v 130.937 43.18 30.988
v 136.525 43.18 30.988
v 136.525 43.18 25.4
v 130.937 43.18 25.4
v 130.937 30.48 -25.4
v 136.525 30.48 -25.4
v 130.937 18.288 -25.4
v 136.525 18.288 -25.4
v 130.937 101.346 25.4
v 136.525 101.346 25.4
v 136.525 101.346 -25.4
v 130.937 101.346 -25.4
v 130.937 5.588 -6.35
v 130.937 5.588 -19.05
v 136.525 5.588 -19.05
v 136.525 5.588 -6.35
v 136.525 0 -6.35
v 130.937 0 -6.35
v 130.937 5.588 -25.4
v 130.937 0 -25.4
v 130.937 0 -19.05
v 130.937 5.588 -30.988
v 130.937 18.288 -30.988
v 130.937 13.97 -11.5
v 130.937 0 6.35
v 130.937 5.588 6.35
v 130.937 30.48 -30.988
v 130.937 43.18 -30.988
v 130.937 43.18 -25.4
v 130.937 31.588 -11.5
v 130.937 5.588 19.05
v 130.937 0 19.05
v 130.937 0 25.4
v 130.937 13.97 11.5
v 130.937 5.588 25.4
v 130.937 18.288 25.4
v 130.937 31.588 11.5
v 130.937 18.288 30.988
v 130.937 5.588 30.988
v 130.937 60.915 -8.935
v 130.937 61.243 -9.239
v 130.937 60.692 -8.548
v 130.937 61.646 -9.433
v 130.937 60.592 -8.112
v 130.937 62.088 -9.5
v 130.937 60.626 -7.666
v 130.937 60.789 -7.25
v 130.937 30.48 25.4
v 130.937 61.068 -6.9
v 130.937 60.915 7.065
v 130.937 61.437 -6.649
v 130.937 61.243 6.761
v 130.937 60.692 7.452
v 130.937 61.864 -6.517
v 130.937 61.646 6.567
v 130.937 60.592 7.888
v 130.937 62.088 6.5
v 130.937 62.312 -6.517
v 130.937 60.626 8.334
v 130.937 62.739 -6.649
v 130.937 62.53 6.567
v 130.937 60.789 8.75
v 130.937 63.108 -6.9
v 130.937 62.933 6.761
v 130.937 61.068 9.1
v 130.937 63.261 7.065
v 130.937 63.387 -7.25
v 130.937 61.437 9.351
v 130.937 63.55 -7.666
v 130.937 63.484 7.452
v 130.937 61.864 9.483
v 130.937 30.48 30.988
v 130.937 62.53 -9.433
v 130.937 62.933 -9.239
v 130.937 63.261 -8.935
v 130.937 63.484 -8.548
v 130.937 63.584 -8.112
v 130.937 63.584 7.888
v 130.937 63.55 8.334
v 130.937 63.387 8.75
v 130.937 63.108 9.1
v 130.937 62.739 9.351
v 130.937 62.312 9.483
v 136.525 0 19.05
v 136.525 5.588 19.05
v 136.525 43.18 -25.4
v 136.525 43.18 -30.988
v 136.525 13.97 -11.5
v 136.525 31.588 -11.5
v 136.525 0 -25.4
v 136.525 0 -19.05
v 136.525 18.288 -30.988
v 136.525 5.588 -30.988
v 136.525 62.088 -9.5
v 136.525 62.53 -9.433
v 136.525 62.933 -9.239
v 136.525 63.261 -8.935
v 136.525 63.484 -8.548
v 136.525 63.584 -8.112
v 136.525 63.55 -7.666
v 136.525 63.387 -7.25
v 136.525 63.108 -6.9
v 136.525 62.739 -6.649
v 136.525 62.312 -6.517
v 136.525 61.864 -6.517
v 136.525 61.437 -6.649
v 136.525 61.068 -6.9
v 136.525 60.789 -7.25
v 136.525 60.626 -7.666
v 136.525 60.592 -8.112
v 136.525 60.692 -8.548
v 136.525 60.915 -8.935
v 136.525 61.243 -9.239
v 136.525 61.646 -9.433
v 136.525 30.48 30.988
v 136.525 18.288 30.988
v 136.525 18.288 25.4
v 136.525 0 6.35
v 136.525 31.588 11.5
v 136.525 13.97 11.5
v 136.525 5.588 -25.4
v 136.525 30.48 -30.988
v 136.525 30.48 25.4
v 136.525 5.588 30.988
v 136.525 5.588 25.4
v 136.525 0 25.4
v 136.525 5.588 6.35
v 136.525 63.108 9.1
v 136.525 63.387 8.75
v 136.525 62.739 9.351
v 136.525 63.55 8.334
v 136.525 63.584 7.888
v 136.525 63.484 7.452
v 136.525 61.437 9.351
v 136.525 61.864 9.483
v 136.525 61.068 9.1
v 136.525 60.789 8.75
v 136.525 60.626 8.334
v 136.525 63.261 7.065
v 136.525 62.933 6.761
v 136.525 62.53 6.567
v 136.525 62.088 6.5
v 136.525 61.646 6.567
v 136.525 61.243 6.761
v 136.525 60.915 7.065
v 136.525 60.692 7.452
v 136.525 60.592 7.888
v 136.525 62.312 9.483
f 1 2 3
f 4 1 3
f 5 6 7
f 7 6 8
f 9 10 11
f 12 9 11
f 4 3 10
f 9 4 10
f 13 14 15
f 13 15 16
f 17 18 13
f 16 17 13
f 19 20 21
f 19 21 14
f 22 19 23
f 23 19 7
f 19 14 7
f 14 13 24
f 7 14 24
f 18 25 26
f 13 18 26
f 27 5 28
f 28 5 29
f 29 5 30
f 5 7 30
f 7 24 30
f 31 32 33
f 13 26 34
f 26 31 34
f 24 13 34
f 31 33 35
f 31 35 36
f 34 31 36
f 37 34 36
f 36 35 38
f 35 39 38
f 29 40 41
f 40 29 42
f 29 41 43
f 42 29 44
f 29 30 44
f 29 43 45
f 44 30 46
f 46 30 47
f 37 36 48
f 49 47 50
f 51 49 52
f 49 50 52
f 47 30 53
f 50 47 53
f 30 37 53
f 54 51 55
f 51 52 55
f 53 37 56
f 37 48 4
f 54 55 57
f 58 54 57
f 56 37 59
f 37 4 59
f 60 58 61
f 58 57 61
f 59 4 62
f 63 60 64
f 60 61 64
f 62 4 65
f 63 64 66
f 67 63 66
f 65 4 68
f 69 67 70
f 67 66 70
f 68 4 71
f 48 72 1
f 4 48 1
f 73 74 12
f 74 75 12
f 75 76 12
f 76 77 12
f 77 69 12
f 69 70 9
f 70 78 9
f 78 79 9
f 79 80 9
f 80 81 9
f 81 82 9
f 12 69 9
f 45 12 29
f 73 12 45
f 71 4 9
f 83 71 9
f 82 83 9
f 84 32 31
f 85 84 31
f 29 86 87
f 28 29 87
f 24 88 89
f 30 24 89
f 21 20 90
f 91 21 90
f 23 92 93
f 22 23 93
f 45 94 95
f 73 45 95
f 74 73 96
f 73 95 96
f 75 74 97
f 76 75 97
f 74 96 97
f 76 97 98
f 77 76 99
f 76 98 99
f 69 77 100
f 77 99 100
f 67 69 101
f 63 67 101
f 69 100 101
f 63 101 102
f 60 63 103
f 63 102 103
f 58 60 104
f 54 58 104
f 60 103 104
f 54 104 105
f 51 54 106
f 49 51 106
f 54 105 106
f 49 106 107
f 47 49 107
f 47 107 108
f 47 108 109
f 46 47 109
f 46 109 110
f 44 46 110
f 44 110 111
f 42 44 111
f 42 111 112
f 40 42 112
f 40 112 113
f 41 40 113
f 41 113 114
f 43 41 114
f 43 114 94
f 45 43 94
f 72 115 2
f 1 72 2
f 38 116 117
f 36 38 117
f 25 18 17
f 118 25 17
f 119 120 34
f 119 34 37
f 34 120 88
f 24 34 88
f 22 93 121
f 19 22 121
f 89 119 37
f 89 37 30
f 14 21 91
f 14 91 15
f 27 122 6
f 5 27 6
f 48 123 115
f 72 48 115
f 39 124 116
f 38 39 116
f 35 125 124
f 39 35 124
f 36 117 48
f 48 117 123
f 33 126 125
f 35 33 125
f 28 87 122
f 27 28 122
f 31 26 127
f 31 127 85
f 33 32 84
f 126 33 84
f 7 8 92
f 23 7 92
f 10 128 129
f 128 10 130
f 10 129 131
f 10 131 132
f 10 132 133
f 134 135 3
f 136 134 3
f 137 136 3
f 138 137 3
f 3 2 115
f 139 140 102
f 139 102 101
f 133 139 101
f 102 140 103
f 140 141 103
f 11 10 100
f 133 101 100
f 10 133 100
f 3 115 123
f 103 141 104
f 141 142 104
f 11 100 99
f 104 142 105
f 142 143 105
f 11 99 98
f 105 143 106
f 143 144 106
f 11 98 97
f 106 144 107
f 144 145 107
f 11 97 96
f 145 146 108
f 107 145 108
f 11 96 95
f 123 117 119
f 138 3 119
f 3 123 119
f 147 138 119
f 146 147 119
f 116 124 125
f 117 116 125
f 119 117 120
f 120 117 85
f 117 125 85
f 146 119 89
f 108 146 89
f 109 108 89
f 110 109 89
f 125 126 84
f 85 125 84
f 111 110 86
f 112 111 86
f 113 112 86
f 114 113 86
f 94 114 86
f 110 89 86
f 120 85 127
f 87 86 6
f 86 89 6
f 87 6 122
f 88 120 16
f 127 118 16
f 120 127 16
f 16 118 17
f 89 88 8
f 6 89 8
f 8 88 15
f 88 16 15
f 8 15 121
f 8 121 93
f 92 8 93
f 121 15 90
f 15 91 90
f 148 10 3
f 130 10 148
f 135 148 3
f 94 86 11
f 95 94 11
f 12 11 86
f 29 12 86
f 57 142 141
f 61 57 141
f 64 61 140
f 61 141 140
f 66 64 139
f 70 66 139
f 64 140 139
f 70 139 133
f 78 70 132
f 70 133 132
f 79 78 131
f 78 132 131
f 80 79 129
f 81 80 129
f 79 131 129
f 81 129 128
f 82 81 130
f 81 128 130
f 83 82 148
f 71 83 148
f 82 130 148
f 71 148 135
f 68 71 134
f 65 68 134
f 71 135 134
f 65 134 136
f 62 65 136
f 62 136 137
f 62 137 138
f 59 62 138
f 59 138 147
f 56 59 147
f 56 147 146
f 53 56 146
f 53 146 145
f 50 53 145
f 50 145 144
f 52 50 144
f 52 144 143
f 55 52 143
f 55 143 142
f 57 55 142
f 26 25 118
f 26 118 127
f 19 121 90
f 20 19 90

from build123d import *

# Parameters (mm, degrees)
SKETCH1_W              = 273.05
SKETCH1_H              = 139.7
BOSS_EXTRUDE1_DEPTH    = 5.588
SKETCH2_W              = 273.05
SKETCH2_H              = 139.7
SKETCH2_W_2            = 261.874
SKETCH2_H_2            = 128.524
BOSS_EXTRUDE2_DEPTH    = 298.45
SKETCH3_W              = 6.35
SKETCH3_H              = 16.933333333
SKETCH3_H_2            = 16.933333334
DOOR_SLOT_DEPTH        = 12.7
DOOR_GUIDE_HOLES_REACH = 361.255
SKETCH4_W              = 6.35
SKETCH4_H              = 15.875
LEVER_HOLES_W          = 9.652
LEVER_HOLES_H          = 6.35
LEVER_HOLES_W_2        = 6.35
CUT_EXTRUDE1_DEPTH     = 362.378293578
CUT_EXTRUDE3_REACH     = 416.577
SKETCH8_R              = 3.175
SKETCH16_W             = 327.238778096
SKETCH16_H             = 314.471565403
CUT_EXTRUDE10_DEPTH    = 362.378293578
LEFT_RIGHT_W           = 6.35
LEFT_RIGHT_H           = 5.588
LEFT_RIGHT_W_2         = 12.7
LEFT_RIGHT_H_2         = 12.66825
CUT_EXTRUDE11_DEPTH    = 415.577411883
SKETCH17_R             = 1.5
SKETCH17_W             = 23
SKETCH17_H             = 17.61800007
CUT_EXTRUDE12_DEPTH    = 313.00857951
CUT_EXTRUDE13_DEPTH    = 313.00857951


with BuildPart() as part:
    # Sketch1 → Boss-Extrude1 (new body)
    with BuildSketch(Plane(origin=(0, 0, 0), x_dir=(1, 0, 0), z_dir=(0, 1, 0))):
        Rectangle(SKETCH1_W, SKETCH1_H)
    extrude(amount=BOSS_EXTRUDE1_DEPTH)

    # Sketch2 → Boss-Extrude2 (add)
    with BuildSketch(Plane(origin=(0, 5.588, 0), x_dir=(1, 0, 0), z_dir=(0, 1, 0))):
        Rectangle(SKETCH2_W, SKETCH2_H)
        Rectangle(SKETCH2_W_2, SKETCH2_H_2, mode=Mode.SUBTRACT)
    extrude(amount=BOSS_EXTRUDE2_DEPTH)

    # Sketch3 → Door Slot (cut)
    with BuildSketch(Plane.XY.offset(69.85)):
        with BuildLine():
            Line((-29.337, 282.448), (-29.337, 5.588))
            Line((-29.337, 5.588), (-22.733, 5.588))
            Line((-22.733, 5.588), (-22.733, 291.592))
            Line((-22.733, 291.592), (-42.291, 291.592))
            Line((-42.291, 291.592), (-42.291, 284.988))
            Line((-42.291, 284.988), (-31.877, 284.988))
            ThreePointArc((-31.877, 284.988), (-30.080948776, 284.244051224), (-29.337, 282.448))
        make_face()
        with Locations((-13.208, 80.433333334)):
            Rectangle(SKETCH3_W, SKETCH3_H)
        with Locations((-13.208, 50.8)):
            Rectangle(SKETCH3_W, SKETCH3_H_2)
        with Locations((-13.208, 21.166666667)):
            Rectangle(SKETCH3_W, SKETCH3_H)
    extrude(amount=-DOOR_SLOT_DEPTH, mode=Mode.SUBTRACT)

    # Sketch4 → Door Guide Holes (cut, up to next)
    with BuildSketch(Plane.XY.offset(-64.262), mode=Mode.PRIVATE) as door_guide_holes_sk1:
        with Locations((-45.466, 283.4005)):
            Rectangle(SKETCH4_W, SKETCH4_H)
    door_guide_holes_tool1 = extrude(door_guide_holes_sk1.sketch, amount=-DOOR_GUIDE_HOLES_REACH, mode=Mode.PRIVATE) & part.part
    # Sketch4 → Door Guide Holes (cut, up to next)
    with BuildSketch(Plane.XY.offset(-64.262), mode=Mode.PRIVATE) as door_guide_holes_sk2:
        with Locations((-45.466, 254.8255)):
            Rectangle(SKETCH4_W, SKETCH4_H)
    door_guide_holes_tool2 = extrude(door_guide_holes_sk2.sketch, amount=-DOOR_GUIDE_HOLES_REACH, mode=Mode.PRIVATE) & part.part
    # Sketch4 → Door Guide Holes (cut, up to next)
    with BuildSketch(Plane.XY.offset(-64.262), mode=Mode.PRIVATE) as door_guide_holes_sk3:
        with Locations((-45.466, 226.2505)):
            Rectangle(SKETCH4_W, SKETCH4_H)
    door_guide_holes_tool3 = extrude(door_guide_holes_sk3.sketch, amount=-DOOR_GUIDE_HOLES_REACH, mode=Mode.PRIVATE) & part.part
    # Sketch4 → Door Guide Holes (cut, up to next)
    with BuildSketch(Plane.XY.offset(-64.262), mode=Mode.PRIVATE) as door_guide_holes_sk4:
        with Locations((-45.466, 197.6755)):
            Rectangle(SKETCH4_W, SKETCH4_H)
    door_guide_holes_tool4 = extrude(door_guide_holes_sk4.sketch, amount=-DOOR_GUIDE_HOLES_REACH, mode=Mode.PRIVATE) & part.part
    # Sketch4 → Door Guide Holes (cut, up to next)
    with BuildSketch(Plane.XY.offset(-64.262), mode=Mode.PRIVATE) as door_guide_holes_sk5:
        with Locations((-45.466, 169.1005)):
            Rectangle(SKETCH4_W, SKETCH4_H)
    door_guide_holes_tool5 = extrude(door_guide_holes_sk5.sketch, amount=-DOOR_GUIDE_HOLES_REACH, mode=Mode.PRIVATE) & part.part
    # Sketch4 → Door Guide Holes (cut, up to next)
    with BuildSketch(Plane.XY.offset(-64.262), mode=Mode.PRIVATE) as door_guide_holes_sk6:
        with Locations((-45.466, 140.5255)):
            Rectangle(SKETCH4_W, SKETCH4_H)
    door_guide_holes_tool6 = extrude(door_guide_holes_sk6.sketch, amount=-DOOR_GUIDE_HOLES_REACH, mode=Mode.PRIVATE) & part.part
    # Sketch4 → Door Guide Holes (cut, up to next)
    with BuildSketch(Plane.XY.offset(-64.262), mode=Mode.PRIVATE) as door_guide_holes_sk7:
        with Locations((-45.466, 111.9505)):
            Rectangle(SKETCH4_W, SKETCH4_H)
    door_guide_holes_tool7 = extrude(door_guide_holes_sk7.sketch, amount=-DOOR_GUIDE_HOLES_REACH, mode=Mode.PRIVATE) & part.part
    # Sketch4 → Door Guide Holes (cut, up to next)
    with BuildSketch(Plane.XY.offset(-64.262), mode=Mode.PRIVATE) as door_guide_holes_sk8:
        with Locations((-45.466, 83.3755)):
            Rectangle(SKETCH4_W, SKETCH4_H)
    door_guide_holes_tool8 = extrude(door_guide_holes_sk8.sketch, amount=-DOOR_GUIDE_HOLES_REACH, mode=Mode.PRIVATE) & part.part
    # Sketch4 → Door Guide Holes (cut, up to next)
    with BuildSketch(Plane.XY.offset(-64.262), mode=Mode.PRIVATE) as door_guide_holes_sk9:
        with Locations((-45.466, 54.8005)):
            Rectangle(SKETCH4_W, SKETCH4_H)
    door_guide_holes_tool9 = extrude(door_guide_holes_sk9.sketch, amount=-DOOR_GUIDE_HOLES_REACH, mode=Mode.PRIVATE) & part.part
    # Sketch4 → Door Guide Holes (cut, up to next)
    with BuildSketch(Plane.XY.offset(-64.262), mode=Mode.PRIVATE) as door_guide_holes_sk10:
        with Locations((-45.466, 26.2255)):
            Rectangle(SKETCH4_W, SKETCH4_H)
    door_guide_holes_tool10 = extrude(door_guide_holes_sk10.sketch, amount=-DOOR_GUIDE_HOLES_REACH, mode=Mode.PRIVATE) & part.part
    door_guide_holes_1 = door_guide_holes_tool1.solids().sort_by_distance((-45.466, 283.4005, -64.262))[0]
    add(door_guide_holes_1, mode=Mode.SUBTRACT)
    door_guide_holes_2 = door_guide_holes_tool2.solids().sort_by_distance((-45.466, 254.8255, -64.262))[0]
    add(door_guide_holes_2, mode=Mode.SUBTRACT)
    door_guide_holes_3 = door_guide_holes_tool3.solids().sort_by_distance((-45.466, 226.2505, -64.262))[0]
    add(door_guide_holes_3, mode=Mode.SUBTRACT)
    door_guide_holes_4 = door_guide_holes_tool4.solids().sort_by_distance((-45.466, 197.6755, -64.262))[0]
    add(door_guide_holes_4, mode=Mode.SUBTRACT)
    door_guide_holes_5 = door_guide_holes_tool5.solids().sort_by_distance((-45.466, 169.1005, -64.262))[0]
    add(door_guide_holes_5, mode=Mode.SUBTRACT)
    door_guide_holes_6 = door_guide_holes_tool6.solids().sort_by_distance((-45.466, 140.5255, -64.262))[0]
    add(door_guide_holes_6, mode=Mode.SUBTRACT)
    door_guide_holes_7 = door_guide_holes_tool7.solids().sort_by_distance((-45.466, 111.9505, -64.262))[0]
    add(door_guide_holes_7, mode=Mode.SUBTRACT)
    door_guide_holes_8 = door_guide_holes_tool8.solids().sort_by_distance((-45.466, 83.3755, -64.262))[0]
    add(door_guide_holes_8, mode=Mode.SUBTRACT)
    door_guide_holes_9 = door_guide_holes_tool9.solids().sort_by_distance((-45.466, 54.8005, -64.262))[0]
    add(door_guide_holes_9, mode=Mode.SUBTRACT)
    door_guide_holes_10 = door_guide_holes_tool10.solids().sort_by_distance((-45.466, 26.2255, -64.262))[0]
    add(door_guide_holes_10, mode=Mode.SUBTRACT)
    door_guide_holes = door_guide_holes_1 + door_guide_holes_2 + door_guide_holes_3 + door_guide_holes_4 + door_guide_holes_5 + door_guide_holes_6 + door_guide_holes_7 + door_guide_holes_8 + door_guide_holes_9 + door_guide_holes_10  # Door Guide Holes as one shape, for the pattern or mirror that repeats it

    # Mirror1: Door Guide Holes across plane
    add(door_guide_holes.mirror(Plane.ZY.offset(32.512)), mode=Mode.SUBTRACT)

    # Lever Holes → Cut-Extrude1 (cut, through all)
    with BuildSketch(Plane.XY.offset(69.85)):
        with Locations((54.102, 28.575)):
            Rectangle(LEVER_HOLES_W, LEVER_HOLES_H)
        with Locations((39.3065, 15.875)):
            Rectangle(LEVER_HOLES_W_2, LEVER_HOLES_H)
        with Locations((68.8975, 15.875)):
            Rectangle(LEVER_HOLES_W_2, LEVER_HOLES_H)
    extrude(amount=-CUT_EXTRUDE1_DEPTH, mode=Mode.SUBTRACT)

    # Sketch8 → Cut-Extrude3 (cut, up to next)
    with BuildSketch(Plane.ZY.offset(136.525), mode=Mode.PRIVATE) as cut_extrude3_sk1:
        with Locations((0, 19.05)):
            Circle(SKETCH8_R)
    cut_extrude3_tool1 = extrude(cut_extrude3_sk1.sketch, amount=-CUT_EXTRUDE3_REACH, mode=Mode.PRIVATE) & part.part
    add(cut_extrude3_tool1.solids().sort_by_distance((-136.525, 19.05, 0))[0], mode=Mode.SUBTRACT)

    # Sketch16 → Cut-Extrude10 (cut, through all)
    with BuildSketch(Plane.XY.offset(69.85)):
        with Locations((-32.682389048, 146.802217299)):
            Rectangle(SKETCH16_W, SKETCH16_H)
    extrude(amount=-CUT_EXTRUDE10_DEPTH, mode=Mode.SUBTRACT)

    # Left/Right → Cut-Extrude11 (cut, through all)
    with BuildSketch(Plane.ZY.offset(136.525)):
        with Locations((60.325, 2.794)):
            Rectangle(LEFT_RIGHT_W, LEFT_RIGHT_H)
        with Locations((38.1, 2.794)):
            Rectangle(LEFT_RIGHT_W_2, LEFT_RIGHT_H)
        with Locations((66.675, 19.002375)):
            Rectangle(LEFT_RIGHT_W, LEFT_RIGHT_H_2)
        with Locations((12.7, 2.794)):
            Rectangle(LEFT_RIGHT_W_2, LEFT_RIGHT_H)
        with Locations((66.675, 44.338875)):
            Rectangle(LEFT_RIGHT_W, LEFT_RIGHT_H_2)
        with Locations((-12.7, 2.794)):
            Rectangle(LEFT_RIGHT_W_2, LEFT_RIGHT_H)
        with Locations((66.675, 69.675375)):
            Rectangle(LEFT_RIGHT_W, LEFT_RIGHT_H_2)
        with Locations((-38.1, 2.794)):
            Rectangle(LEFT_RIGHT_W_2, LEFT_RIGHT_H)
        with Locations((66.675, 95.011875)):
            Rectangle(LEFT_RIGHT_W, LEFT_RIGHT_H_2)
        with Locations((-60.325, 2.794)):
            Rectangle(LEFT_RIGHT_W, LEFT_RIGHT_H)
        with Locations((66.675, 120.348375)):
            Rectangle(LEFT_RIGHT_W, LEFT_RIGHT_H_2)
        with Locations((-66.675, 19.002375)):
            Rectangle(LEFT_RIGHT_W, LEFT_RIGHT_H_2)
        with Locations((66.675, 145.684875)):
            Rectangle(LEFT_RIGHT_W, LEFT_RIGHT_H_2)
        with Locations((-66.675, 44.338875)):
            Rectangle(LEFT_RIGHT_W, LEFT_RIGHT_H_2)
        with Locations((66.675, 171.021375)):
            Rectangle(LEFT_RIGHT_W, LEFT_RIGHT_H_2)
        with Locations((-66.675, 69.675375)):
            Rectangle(LEFT_RIGHT_W, LEFT_RIGHT_H_2)
        with Locations((66.675, 196.357875)):
            Rectangle(LEFT_RIGHT_W, LEFT_RIGHT_H_2)
        with Locations((-66.675, 95.011875)):
            Rectangle(LEFT_RIGHT_W, LEFT_RIGHT_H_2)
        with Locations((66.675, 221.694375)):
            Rectangle(LEFT_RIGHT_W, LEFT_RIGHT_H_2)
        with Locations((-66.675, 120.348375)):
            Rectangle(LEFT_RIGHT_W, LEFT_RIGHT_H_2)
        with Locations((66.675, 247.030875)):
            Rectangle(LEFT_RIGHT_W, LEFT_RIGHT_H_2)
        with Locations((-66.675, 145.684875)):
            Rectangle(LEFT_RIGHT_W, LEFT_RIGHT_H_2)
        with Locations((66.675, 272.367375)):
            Rectangle(LEFT_RIGHT_W, LEFT_RIGHT_H_2)
        with Locations((-66.675, 171.021375)):
            Rectangle(LEFT_RIGHT_W, LEFT_RIGHT_H_2)
        with Locations((66.675, 297.703875)):
            Rectangle(LEFT_RIGHT_W, LEFT_RIGHT_H_2)
        with Locations((-66.675, 196.357875)):
            Rectangle(LEFT_RIGHT_W, LEFT_RIGHT_H_2)
        with Locations((-66.675, 221.694375)):
            Rectangle(LEFT_RIGHT_W, LEFT_RIGHT_H_2)
        with Locations((-66.675, 247.030875)):
            Rectangle(LEFT_RIGHT_W, LEFT_RIGHT_H_2)
        with Locations((-66.675, 272.367375)):
            Rectangle(LEFT_RIGHT_W, LEFT_RIGHT_H_2)
        with Locations((-66.675, 297.703875)):
            Rectangle(LEFT_RIGHT_W, LEFT_RIGHT_H_2)
    extrude(amount=-CUT_EXTRUDE11_DEPTH, mode=Mode.SUBTRACT)

    # Sketch17 → Cut-Extrude12 (cut, through all)
    with BuildSketch(Plane(origin=(136.525, 0, 0), x_dir=(0, 0, -1), z_dir=(1, 0, 0))):
        with Locations((-8, 62.088)):
            Circle(SKETCH17_R)
        with Locations((8, 62.088)):
            Circle(SKETCH17_R)
        with Locations((-50.8, 159.894)):
            Circle(SKETCH17_R)
        with Locations((-50.8, 144.144)):
            Circle(SKETCH17_R)
        with Locations(Location((50.8, 144.144, 0), (0, 0, 180))):
            Circle(SKETCH17_R)
        with Locations(Location((50.8, 159.894, 0), (0, 0, 180))):
            Circle(SKETCH17_R)
        with Locations((0, 22.779000035)):
            Rectangle(SKETCH17_W, SKETCH17_H)
    extrude(amount=-CUT_EXTRUDE12_DEPTH, mode=Mode.SUBTRACT)

    # Sketch18 → Cut-Extrude13 (cut, through all)
    with BuildSketch(Plane(origin=(136.525, 0, 0), x_dir=(0, 0, -1), z_dir=(1, 0, 0))):
        Polygon((-69.85, 304.038), (-69.85, 0), (-25.4, 0), (-25.4, 5.588), (-30.988, 5.588), (-30.988, 18.288), (-25.4, 18.288), (-25.4, 30.48), (-30.988, 30.48), (-30.988, 43.18), (-25.4, 43.18), (-25.4, 101.346), (25.4, 101.346), (25.4, 43.18), (30.988, 43.18), (30.988, 30.48), (25.4, 30.48), (25.4, 18.288), (30.988, 18.288), (30.988, 5.588), (25.4, 5.588), (25.4, 0), (69.85, 0), (69.85, 304.038), align=None)
    extrude(amount=-CUT_EXTRUDE13_DEPTH, mode=Mode.SUBTRACT)


solid = part.part
